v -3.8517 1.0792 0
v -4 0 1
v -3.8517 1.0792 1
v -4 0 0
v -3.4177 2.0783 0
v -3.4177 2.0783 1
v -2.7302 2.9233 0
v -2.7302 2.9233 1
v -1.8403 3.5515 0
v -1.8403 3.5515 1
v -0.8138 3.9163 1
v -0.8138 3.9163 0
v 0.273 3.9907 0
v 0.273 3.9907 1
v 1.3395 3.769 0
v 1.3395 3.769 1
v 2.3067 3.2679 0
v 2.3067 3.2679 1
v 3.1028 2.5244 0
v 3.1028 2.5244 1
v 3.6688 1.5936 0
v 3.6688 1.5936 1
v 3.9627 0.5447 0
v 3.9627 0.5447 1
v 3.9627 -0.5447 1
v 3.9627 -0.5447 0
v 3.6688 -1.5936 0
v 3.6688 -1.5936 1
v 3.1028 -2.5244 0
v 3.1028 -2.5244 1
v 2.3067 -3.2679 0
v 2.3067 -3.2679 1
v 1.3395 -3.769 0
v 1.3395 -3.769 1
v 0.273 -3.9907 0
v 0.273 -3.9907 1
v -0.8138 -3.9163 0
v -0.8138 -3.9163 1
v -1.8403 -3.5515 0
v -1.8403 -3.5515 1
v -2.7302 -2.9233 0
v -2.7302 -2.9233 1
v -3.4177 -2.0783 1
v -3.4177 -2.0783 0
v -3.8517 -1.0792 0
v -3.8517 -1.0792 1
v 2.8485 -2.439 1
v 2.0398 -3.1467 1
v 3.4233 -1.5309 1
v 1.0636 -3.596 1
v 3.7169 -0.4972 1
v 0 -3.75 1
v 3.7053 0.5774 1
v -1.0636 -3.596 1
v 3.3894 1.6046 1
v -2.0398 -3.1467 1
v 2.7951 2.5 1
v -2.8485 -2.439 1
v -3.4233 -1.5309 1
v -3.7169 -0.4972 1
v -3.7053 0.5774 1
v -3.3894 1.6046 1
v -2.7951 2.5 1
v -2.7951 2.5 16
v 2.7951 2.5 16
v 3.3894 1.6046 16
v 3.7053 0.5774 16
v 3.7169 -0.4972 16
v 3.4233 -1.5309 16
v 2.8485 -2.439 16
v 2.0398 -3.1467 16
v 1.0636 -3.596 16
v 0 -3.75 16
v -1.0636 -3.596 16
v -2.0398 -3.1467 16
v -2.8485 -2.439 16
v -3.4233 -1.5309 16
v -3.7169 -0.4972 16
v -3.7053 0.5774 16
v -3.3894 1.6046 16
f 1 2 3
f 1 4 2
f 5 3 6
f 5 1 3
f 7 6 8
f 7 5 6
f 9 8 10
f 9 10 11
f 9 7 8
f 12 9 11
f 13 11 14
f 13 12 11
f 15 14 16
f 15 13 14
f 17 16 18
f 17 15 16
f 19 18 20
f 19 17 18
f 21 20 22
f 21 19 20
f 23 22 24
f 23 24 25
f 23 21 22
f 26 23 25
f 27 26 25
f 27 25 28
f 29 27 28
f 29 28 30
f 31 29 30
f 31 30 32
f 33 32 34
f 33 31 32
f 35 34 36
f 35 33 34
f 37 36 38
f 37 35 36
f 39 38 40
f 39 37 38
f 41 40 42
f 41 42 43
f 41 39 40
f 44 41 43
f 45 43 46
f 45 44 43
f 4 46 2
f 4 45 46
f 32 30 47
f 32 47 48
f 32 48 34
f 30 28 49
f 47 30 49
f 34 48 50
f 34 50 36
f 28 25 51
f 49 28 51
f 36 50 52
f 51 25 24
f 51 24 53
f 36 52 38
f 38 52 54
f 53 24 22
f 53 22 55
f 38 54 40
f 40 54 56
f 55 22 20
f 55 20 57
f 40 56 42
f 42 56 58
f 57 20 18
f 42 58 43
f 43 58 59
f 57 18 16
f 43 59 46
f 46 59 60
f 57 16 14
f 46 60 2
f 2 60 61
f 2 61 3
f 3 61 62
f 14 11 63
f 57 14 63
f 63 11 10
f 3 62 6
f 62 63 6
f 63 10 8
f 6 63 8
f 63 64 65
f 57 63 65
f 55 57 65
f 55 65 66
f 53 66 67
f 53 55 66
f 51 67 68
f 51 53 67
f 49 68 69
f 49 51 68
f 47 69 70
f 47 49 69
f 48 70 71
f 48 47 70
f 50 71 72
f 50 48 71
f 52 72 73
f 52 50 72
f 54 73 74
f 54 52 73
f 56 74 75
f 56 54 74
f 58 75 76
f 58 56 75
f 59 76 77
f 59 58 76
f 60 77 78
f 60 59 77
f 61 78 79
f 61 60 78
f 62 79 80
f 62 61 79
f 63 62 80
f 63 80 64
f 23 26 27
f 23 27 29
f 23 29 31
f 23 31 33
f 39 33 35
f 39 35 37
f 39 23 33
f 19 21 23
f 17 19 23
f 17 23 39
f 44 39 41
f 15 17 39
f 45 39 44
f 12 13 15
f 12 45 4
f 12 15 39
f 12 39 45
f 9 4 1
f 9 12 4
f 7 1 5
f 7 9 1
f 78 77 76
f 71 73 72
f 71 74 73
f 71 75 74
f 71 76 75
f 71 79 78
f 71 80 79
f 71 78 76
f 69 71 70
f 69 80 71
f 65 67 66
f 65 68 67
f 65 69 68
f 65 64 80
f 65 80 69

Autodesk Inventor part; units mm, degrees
ref_plane "YZ Plane" through (0, 0, 0) normal (1, 0, 0) x (0, 1, 0)
ref_plane "XZ Plane" through (0, 0, 0) normal (0, 1, 0) x (-1, 0, 0)
ref_plane "XY Plane" through (0, 0, 0) normal (0, 0, 1) x (1, 0, 0)
sketch "Sketch1" plane through (0, 0, 0) normal (0, 0, 1) x (1, 0, 0)
  circle A0 centre (0, 0) radius 3.75
  dimension "d0" = 7.5
extrude "Extrusion1" add sketch "Sketch1" along normal blind 16
sketch "Sketch2" plane through (0, 0, 16) normal (0, 0, 1) x (1, 0, 0)
  circle A0 centre (0, 0) radius 3.75 projected
  line L0 (-2.7951, 2.5) -> (2.7951, 2.5)
  dimension "d3" = 2.5
extrude "Extrusion2" cut sketch "Sketch2" against normal through all contours L0 A0 picked at (-0.7066, 2.6978)
sketch "Sketch3" plane through (0, 0, 0) normal (0, 0, -1) x (-1, 0, 0)
  circle A0 centre (0, 0) radius 4
  dimension "d6" = 8
extrude "Extrusion3" add sketch "Sketch3" against normal blind 1
properties material "Stainless Steel"
